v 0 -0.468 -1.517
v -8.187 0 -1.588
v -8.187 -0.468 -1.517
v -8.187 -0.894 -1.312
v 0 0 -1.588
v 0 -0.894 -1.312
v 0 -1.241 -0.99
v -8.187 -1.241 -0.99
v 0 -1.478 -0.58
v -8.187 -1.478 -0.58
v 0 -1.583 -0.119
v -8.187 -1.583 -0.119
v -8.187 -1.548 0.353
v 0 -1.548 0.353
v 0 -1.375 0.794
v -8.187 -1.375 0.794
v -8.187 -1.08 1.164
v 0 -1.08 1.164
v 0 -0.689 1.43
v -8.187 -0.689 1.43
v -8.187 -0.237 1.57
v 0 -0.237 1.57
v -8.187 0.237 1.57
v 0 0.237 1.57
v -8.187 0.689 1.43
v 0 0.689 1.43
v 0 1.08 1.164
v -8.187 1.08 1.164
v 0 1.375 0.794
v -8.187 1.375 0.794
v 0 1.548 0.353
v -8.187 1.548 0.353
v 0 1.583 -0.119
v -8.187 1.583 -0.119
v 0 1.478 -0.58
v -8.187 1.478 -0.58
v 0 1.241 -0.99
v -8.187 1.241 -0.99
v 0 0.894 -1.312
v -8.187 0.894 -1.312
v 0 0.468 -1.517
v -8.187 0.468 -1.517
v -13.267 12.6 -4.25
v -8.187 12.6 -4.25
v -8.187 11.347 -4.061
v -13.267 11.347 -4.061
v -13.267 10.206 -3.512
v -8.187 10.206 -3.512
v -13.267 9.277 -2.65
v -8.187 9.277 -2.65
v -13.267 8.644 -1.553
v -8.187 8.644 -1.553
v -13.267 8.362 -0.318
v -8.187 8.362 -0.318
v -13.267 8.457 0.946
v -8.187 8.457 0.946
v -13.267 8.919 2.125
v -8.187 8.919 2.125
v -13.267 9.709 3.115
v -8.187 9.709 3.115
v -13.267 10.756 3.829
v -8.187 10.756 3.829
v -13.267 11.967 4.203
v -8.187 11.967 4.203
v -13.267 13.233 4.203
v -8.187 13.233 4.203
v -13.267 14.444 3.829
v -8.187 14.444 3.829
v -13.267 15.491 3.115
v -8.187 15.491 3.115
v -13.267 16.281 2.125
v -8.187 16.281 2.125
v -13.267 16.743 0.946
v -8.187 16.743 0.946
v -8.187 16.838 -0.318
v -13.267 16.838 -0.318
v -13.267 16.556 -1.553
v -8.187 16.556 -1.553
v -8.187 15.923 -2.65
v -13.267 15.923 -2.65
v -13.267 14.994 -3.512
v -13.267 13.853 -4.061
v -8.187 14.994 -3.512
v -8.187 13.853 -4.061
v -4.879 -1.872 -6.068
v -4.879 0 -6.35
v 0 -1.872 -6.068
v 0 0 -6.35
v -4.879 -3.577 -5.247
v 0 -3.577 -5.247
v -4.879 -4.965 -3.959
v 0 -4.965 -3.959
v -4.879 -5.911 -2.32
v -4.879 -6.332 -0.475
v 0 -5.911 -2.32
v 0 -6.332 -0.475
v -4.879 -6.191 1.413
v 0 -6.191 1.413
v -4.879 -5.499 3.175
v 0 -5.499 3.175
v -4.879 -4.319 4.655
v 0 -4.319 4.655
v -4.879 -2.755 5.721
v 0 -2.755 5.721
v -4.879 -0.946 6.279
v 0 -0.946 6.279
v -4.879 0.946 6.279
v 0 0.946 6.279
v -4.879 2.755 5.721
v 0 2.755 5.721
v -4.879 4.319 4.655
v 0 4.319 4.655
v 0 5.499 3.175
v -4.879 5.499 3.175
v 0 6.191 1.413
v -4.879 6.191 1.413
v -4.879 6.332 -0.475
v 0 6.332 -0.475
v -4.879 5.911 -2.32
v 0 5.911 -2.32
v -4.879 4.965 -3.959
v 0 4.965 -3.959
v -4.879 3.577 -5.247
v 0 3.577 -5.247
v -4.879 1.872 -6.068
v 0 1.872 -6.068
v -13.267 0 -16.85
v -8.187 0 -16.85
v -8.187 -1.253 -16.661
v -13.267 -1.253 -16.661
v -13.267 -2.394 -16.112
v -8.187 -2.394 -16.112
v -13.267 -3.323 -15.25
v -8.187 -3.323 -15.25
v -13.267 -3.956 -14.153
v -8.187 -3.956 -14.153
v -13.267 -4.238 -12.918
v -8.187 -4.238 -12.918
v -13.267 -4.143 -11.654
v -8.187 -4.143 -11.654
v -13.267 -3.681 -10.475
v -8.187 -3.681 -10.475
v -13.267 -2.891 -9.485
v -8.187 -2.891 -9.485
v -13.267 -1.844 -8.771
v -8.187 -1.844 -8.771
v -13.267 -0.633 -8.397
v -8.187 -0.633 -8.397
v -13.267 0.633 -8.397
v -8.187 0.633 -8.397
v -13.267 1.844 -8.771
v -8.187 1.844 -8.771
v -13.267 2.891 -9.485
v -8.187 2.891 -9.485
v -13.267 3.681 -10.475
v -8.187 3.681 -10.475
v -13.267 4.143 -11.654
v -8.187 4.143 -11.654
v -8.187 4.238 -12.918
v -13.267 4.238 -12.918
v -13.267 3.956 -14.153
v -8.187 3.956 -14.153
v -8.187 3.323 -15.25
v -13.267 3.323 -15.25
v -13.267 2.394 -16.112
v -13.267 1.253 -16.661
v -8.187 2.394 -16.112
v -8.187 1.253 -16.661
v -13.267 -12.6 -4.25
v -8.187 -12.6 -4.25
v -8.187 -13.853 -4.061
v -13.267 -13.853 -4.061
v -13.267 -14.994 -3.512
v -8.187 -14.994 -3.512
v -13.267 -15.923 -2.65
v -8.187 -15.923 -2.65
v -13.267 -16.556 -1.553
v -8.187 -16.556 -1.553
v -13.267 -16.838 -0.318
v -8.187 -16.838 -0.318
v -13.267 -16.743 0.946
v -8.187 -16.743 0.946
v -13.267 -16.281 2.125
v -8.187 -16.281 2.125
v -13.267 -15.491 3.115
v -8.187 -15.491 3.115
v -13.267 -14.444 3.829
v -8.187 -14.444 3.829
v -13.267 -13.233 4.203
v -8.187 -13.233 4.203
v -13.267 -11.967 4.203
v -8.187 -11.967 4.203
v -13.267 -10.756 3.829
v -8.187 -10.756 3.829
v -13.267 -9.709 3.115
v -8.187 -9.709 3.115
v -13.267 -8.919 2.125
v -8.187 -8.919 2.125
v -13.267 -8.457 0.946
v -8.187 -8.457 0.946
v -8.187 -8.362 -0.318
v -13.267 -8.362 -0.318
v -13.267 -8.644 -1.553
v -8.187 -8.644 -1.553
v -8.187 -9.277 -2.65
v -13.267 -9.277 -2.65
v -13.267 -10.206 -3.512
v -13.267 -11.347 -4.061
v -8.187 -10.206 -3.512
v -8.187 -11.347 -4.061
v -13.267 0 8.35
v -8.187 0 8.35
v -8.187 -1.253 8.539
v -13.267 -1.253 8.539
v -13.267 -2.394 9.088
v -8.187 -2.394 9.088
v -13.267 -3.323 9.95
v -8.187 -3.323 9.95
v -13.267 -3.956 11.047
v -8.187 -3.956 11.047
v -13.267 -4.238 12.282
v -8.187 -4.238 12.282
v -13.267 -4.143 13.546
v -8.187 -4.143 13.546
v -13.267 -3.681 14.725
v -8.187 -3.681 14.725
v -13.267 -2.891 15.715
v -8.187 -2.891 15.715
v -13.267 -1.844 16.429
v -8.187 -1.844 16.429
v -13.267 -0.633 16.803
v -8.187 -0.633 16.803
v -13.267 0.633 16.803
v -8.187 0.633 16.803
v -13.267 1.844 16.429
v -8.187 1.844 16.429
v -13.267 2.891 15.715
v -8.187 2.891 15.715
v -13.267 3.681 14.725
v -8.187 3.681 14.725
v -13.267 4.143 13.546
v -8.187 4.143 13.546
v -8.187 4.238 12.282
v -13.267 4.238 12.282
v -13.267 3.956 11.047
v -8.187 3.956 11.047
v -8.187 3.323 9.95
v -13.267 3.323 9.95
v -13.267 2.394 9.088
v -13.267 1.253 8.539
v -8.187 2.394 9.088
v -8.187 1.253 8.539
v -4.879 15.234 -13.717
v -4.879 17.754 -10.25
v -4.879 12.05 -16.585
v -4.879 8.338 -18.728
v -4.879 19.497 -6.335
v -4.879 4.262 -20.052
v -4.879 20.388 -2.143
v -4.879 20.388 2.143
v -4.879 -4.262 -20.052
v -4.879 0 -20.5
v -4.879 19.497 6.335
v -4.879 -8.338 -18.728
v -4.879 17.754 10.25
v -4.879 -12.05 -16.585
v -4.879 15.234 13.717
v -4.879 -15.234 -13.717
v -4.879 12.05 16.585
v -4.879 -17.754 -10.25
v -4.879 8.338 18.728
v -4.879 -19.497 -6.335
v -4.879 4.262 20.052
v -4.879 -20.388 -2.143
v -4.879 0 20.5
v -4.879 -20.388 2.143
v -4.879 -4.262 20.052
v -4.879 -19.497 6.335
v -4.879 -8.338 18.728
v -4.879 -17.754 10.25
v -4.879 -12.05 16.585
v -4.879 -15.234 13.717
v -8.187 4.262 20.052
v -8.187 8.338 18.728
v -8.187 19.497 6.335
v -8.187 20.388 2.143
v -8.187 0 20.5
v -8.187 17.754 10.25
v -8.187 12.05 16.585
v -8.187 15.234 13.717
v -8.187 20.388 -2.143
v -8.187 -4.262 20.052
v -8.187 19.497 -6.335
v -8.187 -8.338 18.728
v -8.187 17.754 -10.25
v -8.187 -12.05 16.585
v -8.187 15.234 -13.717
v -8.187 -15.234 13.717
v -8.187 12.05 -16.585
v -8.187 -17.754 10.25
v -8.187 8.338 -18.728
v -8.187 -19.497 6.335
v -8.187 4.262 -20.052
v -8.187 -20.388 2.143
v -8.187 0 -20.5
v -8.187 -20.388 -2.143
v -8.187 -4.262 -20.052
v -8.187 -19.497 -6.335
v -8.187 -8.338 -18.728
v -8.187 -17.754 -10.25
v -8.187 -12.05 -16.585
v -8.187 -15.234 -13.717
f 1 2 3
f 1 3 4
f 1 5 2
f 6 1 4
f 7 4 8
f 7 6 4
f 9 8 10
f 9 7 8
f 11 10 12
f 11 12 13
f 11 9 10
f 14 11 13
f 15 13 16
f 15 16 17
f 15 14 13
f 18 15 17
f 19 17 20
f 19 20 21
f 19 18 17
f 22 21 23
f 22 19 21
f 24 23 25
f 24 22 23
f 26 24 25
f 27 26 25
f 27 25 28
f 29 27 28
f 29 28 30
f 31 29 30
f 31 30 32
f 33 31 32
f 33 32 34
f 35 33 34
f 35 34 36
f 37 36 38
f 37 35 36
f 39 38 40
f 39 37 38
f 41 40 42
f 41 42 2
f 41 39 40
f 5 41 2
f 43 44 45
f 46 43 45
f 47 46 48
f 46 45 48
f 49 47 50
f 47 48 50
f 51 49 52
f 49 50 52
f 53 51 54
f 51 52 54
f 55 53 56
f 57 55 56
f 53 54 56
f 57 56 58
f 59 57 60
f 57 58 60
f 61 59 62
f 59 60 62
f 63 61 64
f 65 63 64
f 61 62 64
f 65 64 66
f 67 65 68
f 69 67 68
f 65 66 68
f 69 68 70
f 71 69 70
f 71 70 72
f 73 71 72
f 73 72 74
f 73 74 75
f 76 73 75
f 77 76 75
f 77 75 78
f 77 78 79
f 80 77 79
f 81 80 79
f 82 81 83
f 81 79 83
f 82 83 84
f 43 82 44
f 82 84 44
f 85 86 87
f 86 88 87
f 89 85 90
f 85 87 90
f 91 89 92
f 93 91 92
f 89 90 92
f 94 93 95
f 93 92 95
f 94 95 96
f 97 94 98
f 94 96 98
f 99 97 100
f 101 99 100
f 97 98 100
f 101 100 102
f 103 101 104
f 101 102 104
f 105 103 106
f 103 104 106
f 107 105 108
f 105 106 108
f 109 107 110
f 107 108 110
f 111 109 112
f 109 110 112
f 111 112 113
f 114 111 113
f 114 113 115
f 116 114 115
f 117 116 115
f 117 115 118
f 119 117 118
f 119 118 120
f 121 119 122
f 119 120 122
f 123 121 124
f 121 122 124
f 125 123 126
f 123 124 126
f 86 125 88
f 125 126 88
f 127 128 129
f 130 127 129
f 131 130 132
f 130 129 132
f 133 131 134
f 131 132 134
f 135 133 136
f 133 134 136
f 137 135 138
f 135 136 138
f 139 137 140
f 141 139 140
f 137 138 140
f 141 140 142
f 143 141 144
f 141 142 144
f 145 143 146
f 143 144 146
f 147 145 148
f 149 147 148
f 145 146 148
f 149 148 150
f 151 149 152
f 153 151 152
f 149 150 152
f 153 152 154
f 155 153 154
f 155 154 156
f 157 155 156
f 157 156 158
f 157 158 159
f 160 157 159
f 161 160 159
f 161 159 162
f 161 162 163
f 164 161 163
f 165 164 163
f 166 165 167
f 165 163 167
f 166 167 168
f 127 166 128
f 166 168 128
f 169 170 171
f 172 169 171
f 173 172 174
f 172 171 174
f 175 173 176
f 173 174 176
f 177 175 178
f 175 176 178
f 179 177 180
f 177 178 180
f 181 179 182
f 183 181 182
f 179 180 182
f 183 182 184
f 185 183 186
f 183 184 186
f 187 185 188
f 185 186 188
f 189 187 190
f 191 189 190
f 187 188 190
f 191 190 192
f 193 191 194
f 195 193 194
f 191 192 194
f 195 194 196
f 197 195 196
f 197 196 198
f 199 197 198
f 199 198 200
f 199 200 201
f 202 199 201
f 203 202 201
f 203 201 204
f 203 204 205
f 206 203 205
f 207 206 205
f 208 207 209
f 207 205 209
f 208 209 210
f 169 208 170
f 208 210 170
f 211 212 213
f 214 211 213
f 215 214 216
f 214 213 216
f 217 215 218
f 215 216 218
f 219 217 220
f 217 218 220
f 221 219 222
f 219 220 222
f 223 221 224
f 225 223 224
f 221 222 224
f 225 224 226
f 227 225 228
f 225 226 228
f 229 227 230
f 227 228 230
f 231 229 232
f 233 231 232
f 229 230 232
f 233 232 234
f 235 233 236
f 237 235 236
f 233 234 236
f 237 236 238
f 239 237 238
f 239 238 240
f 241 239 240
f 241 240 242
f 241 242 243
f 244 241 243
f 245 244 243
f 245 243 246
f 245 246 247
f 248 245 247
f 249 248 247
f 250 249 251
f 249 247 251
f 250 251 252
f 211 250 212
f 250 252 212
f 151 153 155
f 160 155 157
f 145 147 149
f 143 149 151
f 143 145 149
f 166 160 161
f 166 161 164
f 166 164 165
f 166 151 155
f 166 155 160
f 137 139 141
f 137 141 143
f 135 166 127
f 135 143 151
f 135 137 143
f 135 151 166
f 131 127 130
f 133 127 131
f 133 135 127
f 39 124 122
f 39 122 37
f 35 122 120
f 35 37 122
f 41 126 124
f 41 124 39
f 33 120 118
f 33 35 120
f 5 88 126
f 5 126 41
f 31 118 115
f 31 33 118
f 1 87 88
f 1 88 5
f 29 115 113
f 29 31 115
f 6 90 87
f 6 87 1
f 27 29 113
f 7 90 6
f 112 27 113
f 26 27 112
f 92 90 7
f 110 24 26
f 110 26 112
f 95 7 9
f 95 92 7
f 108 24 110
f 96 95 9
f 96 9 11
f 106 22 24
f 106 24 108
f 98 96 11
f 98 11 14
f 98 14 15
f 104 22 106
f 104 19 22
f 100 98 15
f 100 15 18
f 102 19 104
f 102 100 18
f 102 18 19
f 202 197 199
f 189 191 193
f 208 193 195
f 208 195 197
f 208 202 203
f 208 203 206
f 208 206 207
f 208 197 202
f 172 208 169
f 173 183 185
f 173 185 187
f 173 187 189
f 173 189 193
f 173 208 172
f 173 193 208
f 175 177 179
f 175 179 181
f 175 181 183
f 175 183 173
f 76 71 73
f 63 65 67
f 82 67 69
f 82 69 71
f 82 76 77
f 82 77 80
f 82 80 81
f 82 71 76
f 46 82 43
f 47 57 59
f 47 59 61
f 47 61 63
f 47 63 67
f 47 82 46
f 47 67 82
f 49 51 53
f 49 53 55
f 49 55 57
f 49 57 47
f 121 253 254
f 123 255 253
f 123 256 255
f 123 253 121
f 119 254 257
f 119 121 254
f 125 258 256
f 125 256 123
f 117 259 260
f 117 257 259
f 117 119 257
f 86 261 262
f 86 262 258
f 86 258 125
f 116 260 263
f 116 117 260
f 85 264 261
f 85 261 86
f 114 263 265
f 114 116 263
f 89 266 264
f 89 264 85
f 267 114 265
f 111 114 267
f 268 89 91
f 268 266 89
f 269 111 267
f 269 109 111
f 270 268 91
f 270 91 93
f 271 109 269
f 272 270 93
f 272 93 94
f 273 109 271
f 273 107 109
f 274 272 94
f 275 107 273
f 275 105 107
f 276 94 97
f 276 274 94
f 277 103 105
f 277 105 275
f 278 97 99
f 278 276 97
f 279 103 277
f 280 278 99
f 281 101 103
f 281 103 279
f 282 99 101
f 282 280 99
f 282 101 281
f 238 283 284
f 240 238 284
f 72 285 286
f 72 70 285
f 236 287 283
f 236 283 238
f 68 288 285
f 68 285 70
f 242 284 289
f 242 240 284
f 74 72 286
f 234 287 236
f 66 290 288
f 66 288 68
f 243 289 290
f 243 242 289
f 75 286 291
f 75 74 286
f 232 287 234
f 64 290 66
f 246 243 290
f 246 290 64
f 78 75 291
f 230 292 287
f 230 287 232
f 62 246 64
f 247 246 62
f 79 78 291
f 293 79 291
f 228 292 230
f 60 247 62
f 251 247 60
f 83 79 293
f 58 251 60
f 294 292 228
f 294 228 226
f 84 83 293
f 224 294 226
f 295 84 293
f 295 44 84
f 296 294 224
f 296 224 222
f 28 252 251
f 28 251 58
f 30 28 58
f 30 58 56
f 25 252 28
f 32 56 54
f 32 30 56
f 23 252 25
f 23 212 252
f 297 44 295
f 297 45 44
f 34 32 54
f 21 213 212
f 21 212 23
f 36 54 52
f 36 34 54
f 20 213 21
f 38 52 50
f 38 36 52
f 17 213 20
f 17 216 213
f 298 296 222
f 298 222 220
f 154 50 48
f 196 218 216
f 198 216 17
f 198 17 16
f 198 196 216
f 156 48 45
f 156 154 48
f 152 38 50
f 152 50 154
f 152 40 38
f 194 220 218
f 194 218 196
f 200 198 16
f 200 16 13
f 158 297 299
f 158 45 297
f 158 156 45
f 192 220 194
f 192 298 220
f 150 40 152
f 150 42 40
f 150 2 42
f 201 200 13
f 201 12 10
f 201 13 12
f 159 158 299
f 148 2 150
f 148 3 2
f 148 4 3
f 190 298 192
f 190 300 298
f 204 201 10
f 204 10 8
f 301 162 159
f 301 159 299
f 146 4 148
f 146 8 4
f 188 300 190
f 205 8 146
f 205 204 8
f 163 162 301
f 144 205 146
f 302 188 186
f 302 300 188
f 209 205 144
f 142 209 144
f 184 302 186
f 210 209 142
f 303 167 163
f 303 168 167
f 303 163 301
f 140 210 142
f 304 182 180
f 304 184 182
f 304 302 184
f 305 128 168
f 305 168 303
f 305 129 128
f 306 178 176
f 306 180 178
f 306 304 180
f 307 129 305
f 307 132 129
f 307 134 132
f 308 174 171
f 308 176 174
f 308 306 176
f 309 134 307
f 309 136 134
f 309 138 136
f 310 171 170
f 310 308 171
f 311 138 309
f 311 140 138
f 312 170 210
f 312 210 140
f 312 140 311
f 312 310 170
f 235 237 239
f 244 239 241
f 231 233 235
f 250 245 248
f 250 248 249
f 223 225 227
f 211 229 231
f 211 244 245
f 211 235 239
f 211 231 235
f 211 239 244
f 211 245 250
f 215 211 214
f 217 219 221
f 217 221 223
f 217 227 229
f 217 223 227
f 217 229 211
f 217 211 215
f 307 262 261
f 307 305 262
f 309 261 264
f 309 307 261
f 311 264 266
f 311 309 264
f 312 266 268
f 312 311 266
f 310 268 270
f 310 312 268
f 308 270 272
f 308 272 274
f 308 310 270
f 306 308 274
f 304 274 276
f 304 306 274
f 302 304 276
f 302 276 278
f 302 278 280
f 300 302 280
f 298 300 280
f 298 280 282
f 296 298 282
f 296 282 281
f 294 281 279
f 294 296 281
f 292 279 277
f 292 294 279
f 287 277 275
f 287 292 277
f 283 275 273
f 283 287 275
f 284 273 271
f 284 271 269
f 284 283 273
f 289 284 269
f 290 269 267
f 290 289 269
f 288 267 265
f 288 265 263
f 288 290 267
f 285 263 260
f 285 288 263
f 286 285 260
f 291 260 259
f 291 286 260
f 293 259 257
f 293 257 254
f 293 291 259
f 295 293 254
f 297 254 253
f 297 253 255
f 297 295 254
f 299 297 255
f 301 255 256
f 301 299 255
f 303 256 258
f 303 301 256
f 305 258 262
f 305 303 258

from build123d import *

# Parameters (mm, degrees)
SKETCH2_R           = 4.25
BOSS_EXTRUDE1_DEPTH = 5.08


with BuildPart() as part:
    # Sketch1 → Revolve1 (revolve)
    with BuildSketch(Plane.XY):
        Polygon((0, 1.5875), (0, 6.35), (-4.87911158, 6.35), (-4.87911158, 20.5), (-8.187387237, 20.5), (-8.187387237, 1.5875), align=None)
    revolve(axis=Axis((0, 0, 0), (-1, 0, 0)))

    # Sketch2 → Boss-Extrude1 (add)
    with BuildSketch(Plane.ZY.offset(8.187387237)):
        with Locations((0, 12.6)):
            Circle(SKETCH2_R)
        with Locations((12.6, 0)):
            Circle(SKETCH2_R)
        with Locations((0, -12.6)):
            Circle(SKETCH2_R)
        with Locations((-12.6, 0)):
            Circle(SKETCH2_R)
    extrude(amount=BOSS_EXTRUDE1_DEPTH)


solid = part.part
